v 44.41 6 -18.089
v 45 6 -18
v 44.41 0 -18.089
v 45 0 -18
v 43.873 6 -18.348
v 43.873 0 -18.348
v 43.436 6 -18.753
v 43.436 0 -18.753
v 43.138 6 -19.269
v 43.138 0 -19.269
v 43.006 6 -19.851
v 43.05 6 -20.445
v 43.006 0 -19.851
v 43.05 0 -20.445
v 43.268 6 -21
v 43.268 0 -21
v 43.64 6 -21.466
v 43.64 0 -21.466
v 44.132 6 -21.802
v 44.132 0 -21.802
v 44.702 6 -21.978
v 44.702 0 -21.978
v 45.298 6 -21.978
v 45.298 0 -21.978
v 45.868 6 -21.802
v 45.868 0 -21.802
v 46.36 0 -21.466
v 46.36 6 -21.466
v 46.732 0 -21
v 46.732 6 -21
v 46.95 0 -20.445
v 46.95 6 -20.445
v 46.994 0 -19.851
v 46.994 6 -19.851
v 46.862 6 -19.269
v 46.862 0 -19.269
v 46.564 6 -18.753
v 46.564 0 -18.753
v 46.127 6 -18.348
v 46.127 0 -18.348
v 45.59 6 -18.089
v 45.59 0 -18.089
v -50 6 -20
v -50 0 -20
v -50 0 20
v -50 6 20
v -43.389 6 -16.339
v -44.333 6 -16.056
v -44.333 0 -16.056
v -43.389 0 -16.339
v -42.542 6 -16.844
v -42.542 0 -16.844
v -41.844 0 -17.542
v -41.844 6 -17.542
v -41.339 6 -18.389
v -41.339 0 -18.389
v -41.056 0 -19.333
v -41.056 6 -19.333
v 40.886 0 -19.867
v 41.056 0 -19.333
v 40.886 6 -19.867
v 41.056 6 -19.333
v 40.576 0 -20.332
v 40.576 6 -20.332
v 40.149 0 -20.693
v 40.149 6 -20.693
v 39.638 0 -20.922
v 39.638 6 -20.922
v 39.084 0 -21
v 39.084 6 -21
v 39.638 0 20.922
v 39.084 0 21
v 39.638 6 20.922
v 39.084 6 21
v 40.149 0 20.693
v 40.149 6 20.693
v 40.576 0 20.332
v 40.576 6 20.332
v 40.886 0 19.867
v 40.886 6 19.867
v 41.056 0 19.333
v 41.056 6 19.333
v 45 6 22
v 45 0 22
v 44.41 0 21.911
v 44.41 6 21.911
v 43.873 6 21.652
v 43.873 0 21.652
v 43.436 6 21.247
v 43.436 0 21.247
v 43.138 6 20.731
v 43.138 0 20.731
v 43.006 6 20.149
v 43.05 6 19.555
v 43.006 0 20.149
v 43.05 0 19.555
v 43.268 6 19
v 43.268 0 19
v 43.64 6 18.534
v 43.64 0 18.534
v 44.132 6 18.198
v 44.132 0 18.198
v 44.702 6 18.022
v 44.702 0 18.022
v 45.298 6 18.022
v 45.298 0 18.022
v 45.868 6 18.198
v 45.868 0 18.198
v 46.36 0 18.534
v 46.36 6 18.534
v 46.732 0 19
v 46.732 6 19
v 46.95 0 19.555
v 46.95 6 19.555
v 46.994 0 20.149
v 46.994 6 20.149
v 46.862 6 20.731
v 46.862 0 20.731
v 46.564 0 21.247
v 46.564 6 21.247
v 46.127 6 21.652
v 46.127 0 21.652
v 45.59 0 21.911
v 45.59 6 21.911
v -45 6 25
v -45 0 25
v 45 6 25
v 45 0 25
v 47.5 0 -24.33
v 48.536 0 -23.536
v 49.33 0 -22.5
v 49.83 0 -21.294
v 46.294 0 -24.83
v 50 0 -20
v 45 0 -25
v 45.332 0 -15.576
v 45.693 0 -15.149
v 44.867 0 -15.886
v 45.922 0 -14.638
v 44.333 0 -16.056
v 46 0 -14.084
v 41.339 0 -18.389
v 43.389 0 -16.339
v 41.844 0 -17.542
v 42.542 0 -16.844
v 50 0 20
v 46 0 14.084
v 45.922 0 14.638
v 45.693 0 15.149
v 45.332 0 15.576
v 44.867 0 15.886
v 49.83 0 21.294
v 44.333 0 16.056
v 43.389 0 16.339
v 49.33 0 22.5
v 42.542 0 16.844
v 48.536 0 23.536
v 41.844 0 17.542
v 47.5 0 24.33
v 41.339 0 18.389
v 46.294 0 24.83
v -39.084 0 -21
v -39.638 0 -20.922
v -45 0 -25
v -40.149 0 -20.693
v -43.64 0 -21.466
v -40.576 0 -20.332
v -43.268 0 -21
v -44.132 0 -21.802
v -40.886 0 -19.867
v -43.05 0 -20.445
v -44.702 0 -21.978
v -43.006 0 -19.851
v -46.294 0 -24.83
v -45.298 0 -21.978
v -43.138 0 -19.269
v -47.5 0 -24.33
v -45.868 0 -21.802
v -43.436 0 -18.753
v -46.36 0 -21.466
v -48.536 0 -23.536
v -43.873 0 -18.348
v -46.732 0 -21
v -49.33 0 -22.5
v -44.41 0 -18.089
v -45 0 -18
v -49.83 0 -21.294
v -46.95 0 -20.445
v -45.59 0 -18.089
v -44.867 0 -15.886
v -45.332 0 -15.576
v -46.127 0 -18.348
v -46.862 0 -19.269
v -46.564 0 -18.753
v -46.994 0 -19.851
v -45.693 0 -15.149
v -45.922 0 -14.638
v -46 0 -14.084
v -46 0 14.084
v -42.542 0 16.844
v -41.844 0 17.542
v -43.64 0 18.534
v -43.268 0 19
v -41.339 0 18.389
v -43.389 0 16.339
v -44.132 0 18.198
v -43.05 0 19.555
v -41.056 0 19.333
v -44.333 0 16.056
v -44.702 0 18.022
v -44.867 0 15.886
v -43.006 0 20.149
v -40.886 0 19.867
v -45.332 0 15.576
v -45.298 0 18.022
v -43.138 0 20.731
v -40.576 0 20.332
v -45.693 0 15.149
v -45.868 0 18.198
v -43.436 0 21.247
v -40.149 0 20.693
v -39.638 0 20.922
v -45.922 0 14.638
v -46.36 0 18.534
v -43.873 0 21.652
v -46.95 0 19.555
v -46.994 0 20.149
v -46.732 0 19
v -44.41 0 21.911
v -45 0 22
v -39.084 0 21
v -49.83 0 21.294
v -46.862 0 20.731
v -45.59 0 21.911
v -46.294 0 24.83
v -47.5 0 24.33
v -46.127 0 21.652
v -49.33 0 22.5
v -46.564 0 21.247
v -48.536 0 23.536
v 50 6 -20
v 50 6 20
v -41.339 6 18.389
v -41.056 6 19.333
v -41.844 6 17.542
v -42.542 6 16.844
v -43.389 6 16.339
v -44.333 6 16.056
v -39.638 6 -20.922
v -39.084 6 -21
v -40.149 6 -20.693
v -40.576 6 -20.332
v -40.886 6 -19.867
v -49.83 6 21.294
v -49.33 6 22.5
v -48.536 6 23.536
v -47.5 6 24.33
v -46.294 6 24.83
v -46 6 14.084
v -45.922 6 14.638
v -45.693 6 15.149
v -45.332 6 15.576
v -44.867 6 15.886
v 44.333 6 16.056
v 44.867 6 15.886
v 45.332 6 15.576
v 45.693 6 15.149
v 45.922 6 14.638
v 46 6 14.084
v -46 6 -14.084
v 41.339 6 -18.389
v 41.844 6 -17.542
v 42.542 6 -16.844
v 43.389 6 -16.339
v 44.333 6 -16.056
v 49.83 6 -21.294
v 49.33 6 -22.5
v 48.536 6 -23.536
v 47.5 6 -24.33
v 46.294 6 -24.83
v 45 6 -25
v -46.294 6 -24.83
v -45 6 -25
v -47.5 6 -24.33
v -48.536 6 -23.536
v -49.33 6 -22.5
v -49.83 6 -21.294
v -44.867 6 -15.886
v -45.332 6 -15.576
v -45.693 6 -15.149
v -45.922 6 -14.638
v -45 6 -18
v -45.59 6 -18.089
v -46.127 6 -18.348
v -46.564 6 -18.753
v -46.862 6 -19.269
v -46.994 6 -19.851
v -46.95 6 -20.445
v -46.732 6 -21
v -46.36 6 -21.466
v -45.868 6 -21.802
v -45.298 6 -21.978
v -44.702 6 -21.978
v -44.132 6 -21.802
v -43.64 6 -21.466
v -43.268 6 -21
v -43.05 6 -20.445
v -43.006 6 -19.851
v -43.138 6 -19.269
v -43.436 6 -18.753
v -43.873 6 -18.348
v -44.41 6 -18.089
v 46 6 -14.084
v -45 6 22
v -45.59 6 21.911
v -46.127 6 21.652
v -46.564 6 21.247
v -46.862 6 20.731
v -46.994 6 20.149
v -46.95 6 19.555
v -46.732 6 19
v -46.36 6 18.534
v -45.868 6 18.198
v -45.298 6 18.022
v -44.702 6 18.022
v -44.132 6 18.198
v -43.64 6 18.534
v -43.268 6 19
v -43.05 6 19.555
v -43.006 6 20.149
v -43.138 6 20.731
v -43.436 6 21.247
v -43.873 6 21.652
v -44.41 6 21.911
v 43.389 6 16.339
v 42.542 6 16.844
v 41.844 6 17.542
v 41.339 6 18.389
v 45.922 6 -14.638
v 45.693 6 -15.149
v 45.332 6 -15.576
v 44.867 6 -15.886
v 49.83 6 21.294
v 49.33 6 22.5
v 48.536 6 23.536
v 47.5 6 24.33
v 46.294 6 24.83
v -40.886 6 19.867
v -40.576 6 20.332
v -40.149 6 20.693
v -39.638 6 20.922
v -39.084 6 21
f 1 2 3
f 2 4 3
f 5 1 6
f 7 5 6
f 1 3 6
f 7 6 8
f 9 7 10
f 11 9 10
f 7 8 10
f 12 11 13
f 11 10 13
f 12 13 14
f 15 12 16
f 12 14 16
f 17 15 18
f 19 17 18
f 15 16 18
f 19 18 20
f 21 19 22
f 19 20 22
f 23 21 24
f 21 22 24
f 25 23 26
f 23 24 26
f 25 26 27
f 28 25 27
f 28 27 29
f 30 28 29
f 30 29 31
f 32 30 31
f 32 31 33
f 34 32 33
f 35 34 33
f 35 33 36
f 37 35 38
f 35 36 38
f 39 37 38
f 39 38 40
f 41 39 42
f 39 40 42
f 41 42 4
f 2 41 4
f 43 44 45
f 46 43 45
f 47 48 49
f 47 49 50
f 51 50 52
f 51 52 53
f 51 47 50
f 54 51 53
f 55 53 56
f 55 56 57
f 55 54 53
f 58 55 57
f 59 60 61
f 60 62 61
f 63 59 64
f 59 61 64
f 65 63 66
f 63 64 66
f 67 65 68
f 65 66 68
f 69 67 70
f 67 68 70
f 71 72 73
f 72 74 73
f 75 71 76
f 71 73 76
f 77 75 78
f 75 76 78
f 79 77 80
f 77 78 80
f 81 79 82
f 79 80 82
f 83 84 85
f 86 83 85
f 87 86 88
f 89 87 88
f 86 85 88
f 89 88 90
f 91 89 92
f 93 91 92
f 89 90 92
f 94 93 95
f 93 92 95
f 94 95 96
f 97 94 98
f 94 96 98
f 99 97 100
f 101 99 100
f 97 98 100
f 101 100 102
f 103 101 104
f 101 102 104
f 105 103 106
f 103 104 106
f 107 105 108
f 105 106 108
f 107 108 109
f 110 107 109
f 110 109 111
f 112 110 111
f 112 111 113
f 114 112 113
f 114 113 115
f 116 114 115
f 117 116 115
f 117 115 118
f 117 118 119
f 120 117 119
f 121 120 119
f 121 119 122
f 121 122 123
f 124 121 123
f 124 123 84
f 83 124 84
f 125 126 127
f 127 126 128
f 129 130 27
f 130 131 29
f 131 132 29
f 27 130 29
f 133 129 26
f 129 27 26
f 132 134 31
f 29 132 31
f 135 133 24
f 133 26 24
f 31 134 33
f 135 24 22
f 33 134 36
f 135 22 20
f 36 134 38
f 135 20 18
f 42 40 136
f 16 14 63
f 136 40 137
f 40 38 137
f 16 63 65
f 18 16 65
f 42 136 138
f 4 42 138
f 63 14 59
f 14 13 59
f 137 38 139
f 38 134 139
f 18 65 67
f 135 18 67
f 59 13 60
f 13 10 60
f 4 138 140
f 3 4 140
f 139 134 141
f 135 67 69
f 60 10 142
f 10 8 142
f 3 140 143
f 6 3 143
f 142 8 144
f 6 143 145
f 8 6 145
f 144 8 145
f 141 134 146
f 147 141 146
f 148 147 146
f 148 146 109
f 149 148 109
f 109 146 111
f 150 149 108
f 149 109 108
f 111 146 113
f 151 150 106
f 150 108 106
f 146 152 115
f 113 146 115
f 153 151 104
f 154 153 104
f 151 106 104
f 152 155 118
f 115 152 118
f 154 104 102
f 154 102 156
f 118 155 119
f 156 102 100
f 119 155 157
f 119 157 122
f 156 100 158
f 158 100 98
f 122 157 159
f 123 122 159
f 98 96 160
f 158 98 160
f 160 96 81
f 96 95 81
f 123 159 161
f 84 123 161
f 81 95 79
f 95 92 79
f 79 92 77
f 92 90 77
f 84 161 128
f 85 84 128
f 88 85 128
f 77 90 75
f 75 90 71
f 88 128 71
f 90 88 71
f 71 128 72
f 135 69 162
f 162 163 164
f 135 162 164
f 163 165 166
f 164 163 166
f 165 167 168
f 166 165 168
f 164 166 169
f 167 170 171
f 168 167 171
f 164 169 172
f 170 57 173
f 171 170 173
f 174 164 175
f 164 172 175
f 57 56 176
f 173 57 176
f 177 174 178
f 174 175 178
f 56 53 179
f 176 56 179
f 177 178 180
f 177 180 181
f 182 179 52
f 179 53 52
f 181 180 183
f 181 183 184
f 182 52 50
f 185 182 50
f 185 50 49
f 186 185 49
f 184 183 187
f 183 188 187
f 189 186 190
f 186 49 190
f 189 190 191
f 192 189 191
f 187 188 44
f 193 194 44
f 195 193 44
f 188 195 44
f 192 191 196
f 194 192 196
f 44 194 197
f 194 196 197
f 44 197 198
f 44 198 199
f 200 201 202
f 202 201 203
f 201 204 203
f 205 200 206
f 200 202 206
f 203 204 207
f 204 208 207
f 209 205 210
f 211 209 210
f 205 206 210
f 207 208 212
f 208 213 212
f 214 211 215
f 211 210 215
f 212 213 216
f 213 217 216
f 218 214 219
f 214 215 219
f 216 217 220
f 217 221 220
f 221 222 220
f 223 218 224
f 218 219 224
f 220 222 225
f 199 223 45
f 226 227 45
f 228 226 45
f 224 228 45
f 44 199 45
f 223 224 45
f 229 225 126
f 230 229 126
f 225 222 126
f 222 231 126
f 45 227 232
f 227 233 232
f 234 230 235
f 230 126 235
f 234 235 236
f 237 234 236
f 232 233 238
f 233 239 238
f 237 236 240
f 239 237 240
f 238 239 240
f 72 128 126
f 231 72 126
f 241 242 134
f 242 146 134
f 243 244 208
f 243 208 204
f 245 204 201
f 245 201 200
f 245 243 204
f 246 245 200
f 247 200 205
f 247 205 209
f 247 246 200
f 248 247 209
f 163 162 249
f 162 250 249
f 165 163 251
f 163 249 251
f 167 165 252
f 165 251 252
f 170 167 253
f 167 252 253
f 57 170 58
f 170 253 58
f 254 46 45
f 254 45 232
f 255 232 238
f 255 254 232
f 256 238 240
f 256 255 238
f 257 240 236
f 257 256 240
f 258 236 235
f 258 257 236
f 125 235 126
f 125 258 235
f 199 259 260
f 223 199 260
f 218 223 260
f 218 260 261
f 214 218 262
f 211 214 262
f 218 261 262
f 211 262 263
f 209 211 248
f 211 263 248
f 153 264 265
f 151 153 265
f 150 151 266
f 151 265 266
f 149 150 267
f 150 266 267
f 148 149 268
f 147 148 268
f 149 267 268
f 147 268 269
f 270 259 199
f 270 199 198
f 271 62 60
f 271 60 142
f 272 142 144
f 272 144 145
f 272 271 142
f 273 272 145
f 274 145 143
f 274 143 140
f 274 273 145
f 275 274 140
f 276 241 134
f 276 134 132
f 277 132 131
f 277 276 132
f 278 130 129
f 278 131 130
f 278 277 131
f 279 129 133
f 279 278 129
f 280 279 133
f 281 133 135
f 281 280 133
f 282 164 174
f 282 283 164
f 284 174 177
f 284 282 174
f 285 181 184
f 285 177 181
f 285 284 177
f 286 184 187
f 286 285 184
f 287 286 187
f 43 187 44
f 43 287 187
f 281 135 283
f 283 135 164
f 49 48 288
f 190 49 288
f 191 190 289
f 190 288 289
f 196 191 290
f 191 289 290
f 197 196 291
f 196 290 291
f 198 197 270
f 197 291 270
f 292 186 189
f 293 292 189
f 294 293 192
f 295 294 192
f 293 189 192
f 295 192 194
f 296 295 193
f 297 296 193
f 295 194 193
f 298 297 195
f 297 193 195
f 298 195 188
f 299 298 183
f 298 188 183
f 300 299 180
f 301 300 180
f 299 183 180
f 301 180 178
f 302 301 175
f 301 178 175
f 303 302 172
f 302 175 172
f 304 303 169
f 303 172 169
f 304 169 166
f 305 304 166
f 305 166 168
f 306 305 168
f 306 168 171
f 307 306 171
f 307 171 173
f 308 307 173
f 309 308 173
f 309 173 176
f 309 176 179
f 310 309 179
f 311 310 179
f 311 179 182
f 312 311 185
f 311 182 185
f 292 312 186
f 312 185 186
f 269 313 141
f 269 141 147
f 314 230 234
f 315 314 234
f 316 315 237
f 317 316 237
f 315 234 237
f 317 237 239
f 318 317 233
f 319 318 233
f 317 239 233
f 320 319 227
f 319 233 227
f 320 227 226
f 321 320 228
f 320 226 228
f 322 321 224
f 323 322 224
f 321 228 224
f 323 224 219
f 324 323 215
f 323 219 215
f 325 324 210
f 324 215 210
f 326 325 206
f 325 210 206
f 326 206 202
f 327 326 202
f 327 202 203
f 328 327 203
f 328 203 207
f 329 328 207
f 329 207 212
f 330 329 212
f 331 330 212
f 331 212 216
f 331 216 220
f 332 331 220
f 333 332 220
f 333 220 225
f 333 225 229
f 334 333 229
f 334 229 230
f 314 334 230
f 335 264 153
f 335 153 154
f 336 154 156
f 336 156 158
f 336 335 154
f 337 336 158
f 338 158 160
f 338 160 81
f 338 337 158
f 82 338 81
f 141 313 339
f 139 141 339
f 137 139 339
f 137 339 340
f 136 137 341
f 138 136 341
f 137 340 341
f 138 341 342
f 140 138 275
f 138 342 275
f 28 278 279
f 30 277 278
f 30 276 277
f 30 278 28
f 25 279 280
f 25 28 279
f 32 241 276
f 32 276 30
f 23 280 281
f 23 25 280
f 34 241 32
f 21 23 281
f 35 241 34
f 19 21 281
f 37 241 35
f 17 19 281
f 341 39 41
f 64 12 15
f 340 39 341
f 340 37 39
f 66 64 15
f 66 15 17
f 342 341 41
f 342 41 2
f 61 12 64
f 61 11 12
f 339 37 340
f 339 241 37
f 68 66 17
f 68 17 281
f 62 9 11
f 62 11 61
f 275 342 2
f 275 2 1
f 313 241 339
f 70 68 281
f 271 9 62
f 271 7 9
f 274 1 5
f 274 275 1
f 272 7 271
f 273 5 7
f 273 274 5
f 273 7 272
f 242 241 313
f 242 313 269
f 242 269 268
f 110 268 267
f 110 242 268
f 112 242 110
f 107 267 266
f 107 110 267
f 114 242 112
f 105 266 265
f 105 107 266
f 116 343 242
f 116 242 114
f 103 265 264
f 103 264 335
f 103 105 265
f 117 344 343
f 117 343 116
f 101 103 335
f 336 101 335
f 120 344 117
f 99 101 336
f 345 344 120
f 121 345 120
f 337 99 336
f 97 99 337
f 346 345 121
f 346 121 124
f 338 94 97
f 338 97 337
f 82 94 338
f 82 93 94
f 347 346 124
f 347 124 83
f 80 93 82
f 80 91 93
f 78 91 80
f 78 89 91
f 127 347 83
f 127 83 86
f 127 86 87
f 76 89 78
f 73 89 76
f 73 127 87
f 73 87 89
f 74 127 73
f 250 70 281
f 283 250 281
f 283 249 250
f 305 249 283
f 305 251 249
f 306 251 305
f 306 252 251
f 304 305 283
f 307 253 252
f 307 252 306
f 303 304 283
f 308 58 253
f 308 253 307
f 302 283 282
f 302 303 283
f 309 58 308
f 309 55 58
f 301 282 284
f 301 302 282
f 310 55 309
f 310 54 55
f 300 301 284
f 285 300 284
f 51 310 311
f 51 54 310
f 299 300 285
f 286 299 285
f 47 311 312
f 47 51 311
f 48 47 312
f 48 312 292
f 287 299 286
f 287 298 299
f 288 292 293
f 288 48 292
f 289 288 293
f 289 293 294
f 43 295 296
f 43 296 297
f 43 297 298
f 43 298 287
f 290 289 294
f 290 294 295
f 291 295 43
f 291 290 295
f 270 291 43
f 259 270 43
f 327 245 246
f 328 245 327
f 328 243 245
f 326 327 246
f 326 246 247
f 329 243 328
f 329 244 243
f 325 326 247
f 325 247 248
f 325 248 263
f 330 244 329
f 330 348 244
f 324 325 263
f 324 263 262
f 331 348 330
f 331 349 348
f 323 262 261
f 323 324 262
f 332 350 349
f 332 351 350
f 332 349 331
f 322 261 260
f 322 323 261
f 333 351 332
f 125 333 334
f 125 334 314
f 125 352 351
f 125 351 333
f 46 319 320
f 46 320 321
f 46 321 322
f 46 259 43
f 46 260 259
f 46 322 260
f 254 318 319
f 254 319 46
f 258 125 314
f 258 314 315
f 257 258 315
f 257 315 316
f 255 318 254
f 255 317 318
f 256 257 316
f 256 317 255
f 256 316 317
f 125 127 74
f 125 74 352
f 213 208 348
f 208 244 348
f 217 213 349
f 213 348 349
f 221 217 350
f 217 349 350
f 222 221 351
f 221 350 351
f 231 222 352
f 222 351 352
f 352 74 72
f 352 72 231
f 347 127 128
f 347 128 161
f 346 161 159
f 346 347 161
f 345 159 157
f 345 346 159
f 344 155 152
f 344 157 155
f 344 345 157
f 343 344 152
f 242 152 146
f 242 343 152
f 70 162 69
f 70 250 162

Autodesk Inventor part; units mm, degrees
ref_plane "YZ Plane" through (0, 0, 0) normal (1, 0, 0) x (0, 1, 0)
ref_plane "XZ Plane" through (0, 0, 0) normal (0, 1, 0) x (-1, 0, 0)
ref_plane "XY Plane" through (0, 0, 0) normal (0, 0, 1) x (1, 0, 0)
sketch "Sketch1" plane through (0, 0, 0) normal (0, 1, 0) x (-1, 0, 0)
  line L0 (50, 25) -> (-50, 25)
  line L1 (-50, 25) -> (-50, -25)
  line L2 (-50, -25) -> (50, -25)
  line L3 (50, -25) -> (50, 25)
  line L4 (50, 25) -> (-50, -25) construction
  line L5 (-50, 25) -> (50, -25) construction
  point P0 (0, 0)
  dimension "d0" = 100
  dimension "d1" = 50
extrude "Extrusion1" add sketch "Sketch1" along normal blind 6
fillet "Fillet1" radius 5 4 edges at (50, 3, 25) (50, 3, -25) (-50, 3, -25) (-50, 3, 25)
sketch "Sketch2" plane through (0, 6, 0) normal (0, 1, 0) x (1, 0, 0)
  line L0 (-39.5, -21.25) -> (-30.5, -21.25)
  line L1 (-30.5, -21.25) -> (-30.5, -4.75)
  line L2 (-30.5, -4.75) -> (-39.5, -4.75)
  line L3 (-39.5, -4.75) -> (-39.5, -21.25)
  line L4 (-39.5, -21.25) -> (-30.5, -4.75) construction
  line L5 (-30.5, -21.25) -> (-39.5, -4.75) construction
  line L6 (-25.5, -21.25) -> (-16.5, -21.25)
  line L7 (-16.5, -21.25) -> (-16.5, -4.75)
  line L8 (-16.5, -4.75) -> (-25.5, -4.75)
  line L9 (-25.5, -4.75) -> (-25.5, -21.25)
  line L10 (-25.5, -21.25) -> (-16.5, -4.75) construction
  line L11 (-16.5, -21.25) -> (-25.5, -4.75) construction
  line L12 (-11.5, -21.25) -> (-2.5, -21.25)
  line L13 (-2.5, -21.25) -> (-2.5, -4.75)
  line L14 (-2.5, -4.75) -> (-11.5, -4.75)
  line L15 (-11.5, -4.75) -> (-11.5, -21.25)
  line L16 (-11.5, -21.25) -> (-2.5, -4.75) construction
  line L17 (-2.5, -21.25) -> (-11.5, -4.75) construction
  line L18 (2.5, -21.25) -> (11.5, -21.25)
  line L19 (11.5, -21.25) -> (11.5, -4.75)
  line L20 (11.5, -4.75) -> (2.5, -4.75)
  line L21 (2.5, -4.75) -> (2.5, -21.25)
  line L22 (2.5, -21.25) -> (11.5, -4.75) construction
  line L23 (11.5, -21.25) -> (2.5, -4.75) construction
  line L24 (16.5, -21.25) -> (25.5, -21.25)
  line L25 (25.5, -21.25) -> (25.5, -4.75)
  line L26 (25.5, -4.75) -> (16.5, -4.75)
  line L27 (16.5, -4.75) -> (16.5, -21.25)
  line L28 (16.5, -21.25) -> (25.5, -4.75) construction
  line L29 (25.5, -21.25) -> (16.5, -4.75) construction
  line L30 (30.5, -21.25) -> (39.5, -21.25)
  line L31 (39.5, -21.25) -> (39.5, -4.75)
  line L32 (39.5, -4.75) -> (30.5, -4.75)
  line L33 (30.5, -4.75) -> (30.5, -21.25)
  line L34 (30.5, -21.25) -> (39.5, -4.75) construction
  line L35 (39.5, -21.25) -> (30.5, -4.75) construction
  point P0 (0, 0)
  point P1 (-35, -13)
  point P2 (-21, -13)
  point P3 (-7, -13)
  point P4 (7, -13)
  point P5 (21, -13)
  point P6 (35, -13)
  dimension "d5" = 9
  dimension "d6" = 16.5
  dimension "d9" = 14
  dimension "d14" = 7
  dimension "d15" = 13
extrude "Extrusion2" [suppressed]
sketch "Sketch3" plane through (0, 6, 0) normal (0, 1, 0) x (1, 0, 0)
  line L0 (-16.5, -21.25) -> (-25.5, -21.25) projected
  line L1 (-45, -25) -> (45, -25) projected
  line L2 (45, 25) -> (-45, 25) projected
  line L3 (-38, 1) -> (-32, 1)
  line L4 (-32, 1) -> (-32, 21)
  line L5 (-32, 21) -> (-38, 21)
  line L6 (-38, 21) -> (-38, 1)
  line L7 (-38, 1) -> (-32, 21) construction
  line L8 (-32, 1) -> (-38, 21) construction
  line L9 (-24, 1) -> (-18, 1)
  line L10 (-18, 1) -> (-18, 21)
  line L11 (-18, 21) -> (-24, 21)
  line L12 (-24, 21) -> (-24, 1)
  line L13 (-24, 1) -> (-18, 21) construction
  line L14 (-18, 1) -> (-24, 21) construction
  line L15 (-10, 1) -> (-4, 1)
  line L16 (-4, 1) -> (-4, 21)
  line L17 (-4, 21) -> (-10, 21)
  line L18 (-10, 21) -> (-10, 1)
  line L19 (-10, 1) -> (-4, 21) construction
  line L20 (-4, 1) -> (-10, 21) construction
  line L21 (4, 1) -> (10, 1)
  line L22 (10, 1) -> (10, 21)
  line L23 (10, 21) -> (4, 21)
  line L24 (4, 21) -> (4, 1)
  line L25 (4, 1) -> (10, 21) construction
  line L26 (10, 1) -> (4, 21) construction
  line L27 (18, 1) -> (24, 1)
  line L28 (24, 1) -> (24, 21)
  line L29 (24, 21) -> (18, 21)
  line L30 (18, 21) -> (18, 1)
  line L31 (18, 1) -> (24, 21) construction
  line L32 (24, 1) -> (18, 21) construction
  line L33 (32, 1) -> (38, 1)
  line L34 (38, 1) -> (38, 21)
  line L35 (38, 21) -> (32, 21)
  line L36 (32, 21) -> (32, 1)
  line L37 (32, 1) -> (38, 21) construction
  line L38 (38, 1) -> (32, 21) construction
  point P0 (0, 0)
  point P1 (-35, 11)
  point P2 (-21, 11)
  point P3 (-7, 11)
  point P4 (7, 11)
  point P5 (21, 11)
  point P6 (35, 11)
  dimension "d20" = 14
  dimension "d25" = 7
  dimension "d26" = 6
  dimension "d27" = 20
  dimension "d28" = 4
  dimension "d29" = 3.75
extrude "Extrusion3" [suppressed]
sketch "Sketch4" plane through (0, 6, 0) normal (0, 1, 0) x (1, 0, 0)
  arc A0 (-50, -20) -> (-45, -25) centre (-45, -20) ccw projected
  arc A1 (45, -25) -> (50, -20) centre (45, -20) ccw projected
  arc A2 (50, 20) -> (45, 25) centre (45, 20) ccw projected
  arc A3 (-45, 25) -> (-50, 20) centre (-45, 20) ccw projected
  point P0 (0, 0)
hole "Hole1" at (-45, 6, -20) at (45, 6, -20) at (45, 6, 20) at (-45, 6, 20) direction (0, -1, 0) diameter 4 end through all
sketch "Sketch5" plane through (0, 6, 0) normal (0, 1, 0) x (1, 0, 0)
  circle A0 centre (45, -20) radius 2 projected
  circle A1 centre (-45, 20) radius 2 projected
  circle A2 centre (45, 20) radius 2 projected
  circle A3 centre (-45, -20) radius 2 projected
  line L0 (24, 21) -> (24, 1) projected
  line L1 (24, 1) -> (18, 1) projected
  line L2 (18, 1) -> (18, 21) projected
  line L3 (18, 21) -> (24, 21) projected
  line L4 (-4, 21) -> (-4, 1) projected
  line L5 (-4, 1) -> (-10, 1) projected
  line L6 (-10, 1) -> (-10, 21) projected
  line L7 (-10, 21) -> (-4, 21) projected
  line L8 (-32, 21) -> (-32, 1) projected
  line L9 (-32, 1) -> (-38, 1) projected
  line L10 (-38, 1) -> (-38, 21) projected
  line L11 (-38, 21) -> (-32, 21) projected
  line L12 (-18, 21) -> (-18, 1) projected
  line L13 (-18, 1) -> (-24, 1) projected
  line L14 (-24, 1) -> (-24, 21) projected
  line L15 (-24, 21) -> (-18, 21) projected
  line L16 (10, 21) -> (10, 1) projected
  line L17 (10, 1) -> (4, 1) projected
  line L18 (4, 1) -> (4, 21) projected
  line L19 (4, 21) -> (10, 21) projected
  line L20 (38, 21) -> (38, 1) projected
  line L21 (38, 1) -> (32, 1) projected
  line L22 (32, 1) -> (32, 21) projected
  line L23 (32, 21) -> (38, 21) projected
  line L24 (-45, -25) -> (45, -25) projected
  line L25 (50, -20) -> (50, 20) projected
  line L26 (45, 25) -> (-45, 25) projected
  line L27 (-50, 20) -> (-50, -20) projected
  line L28 (-39.0839, 21) -> (39.0839, 21)
  line L29 (-46, -14.0839) -> (-46, 14.0839)
  arc A4 (-44.3333, 16.0559) -> (-41.0559, 19.3333) centre (-45, 20) ccw
  arc A5 (41.0559, 19.3333) -> (44.3333, 16.0559) centre (45, 20) ccw
  arc A6 (44.3333, -16.0559) -> (41.0559, -19.3333) centre (45, -20) ccw
  arc A7 (-41.0559, -19.3333) -> (-44.3333, -16.0559) centre (-45, -20) ccw
  line L30 (46, 14.0839) -> (46, -14.0839)
  line L31 (39.0839, -21) -> (-39.0839, -21)
  arc A8 (41.0559, 19.3333) -> (39.0839, 21) centre (39.0839, 19) ccw
  arc A9 (46, 14.0839) -> (44.3333, 16.0559) centre (44, 14.0839) ccw
  arc A10 (44.3333, -16.0559) -> (46, -14.0839) centre (44, -14.0839) ccw
  arc A11 (39.0839, -21) -> (41.0559, -19.3333) centre (39.0839, -19) ccw
  arc A12 (-41.0559, -19.3333) -> (-39.0839, -21) centre (-39.0839, -19) ccw
  arc A13 (-46, -14.0839) -> (-44.3333, -16.0559) centre (-44, -14.0839) ccw
  arc A14 (-39.0839, 21) -> (-41.0559, 19.3333) centre (-39.0839, 19) ccw
  arc A15 (-44.3333, 16.0559) -> (-46, 14.0839) centre (-44, 14.0839) ccw
  point P0 (0, 0)
  point P1 (41.127, 21)
  point P2 (41.127, -21)
  point P3 (-46, -16.127)
  point P4 (-46, 16.127)
  point P5 (46, 16.127)
  point P6 (46, -16.127)
  point P7 (-41.127, -21)
  point P8 (-41.127, 21)
  dimension "d39" = 4
  dimension "d40" = 8
  dimension "d41" = 8
  dimension "d42" = 8
  dimension "d43" = 8
  dimension "d44" = 4
  dimension "d45" = 4
  dimension "d46" = 4
  dimension "d47" = 2
extrude "Extrusion4" cut sketch "Sketch5" against normal blind 10 contours L28 L22 L21 L20 A8 A5 A9 L30 A10 A6 A11 L31 A12 A7 A13 L29 A15 A4 A14 L10 L9 L8 L14 L13 L12 L6 L5 L4 L18 L17 L16 L2 L1 L0 | L0 L1 L2 L3 | L23 L20 L21 L22 | L16 L17 L18 L19 | L4 L5 L6 L7 | L12 L13 L14 L15 | L8 L9 L10 L11
equation "\"d14\" = 0.5 * d9"
equation "\"d25\" = 0.5 * d20"
properties part number "AcrylicLowerCore" material "Acrylic, Clear"
